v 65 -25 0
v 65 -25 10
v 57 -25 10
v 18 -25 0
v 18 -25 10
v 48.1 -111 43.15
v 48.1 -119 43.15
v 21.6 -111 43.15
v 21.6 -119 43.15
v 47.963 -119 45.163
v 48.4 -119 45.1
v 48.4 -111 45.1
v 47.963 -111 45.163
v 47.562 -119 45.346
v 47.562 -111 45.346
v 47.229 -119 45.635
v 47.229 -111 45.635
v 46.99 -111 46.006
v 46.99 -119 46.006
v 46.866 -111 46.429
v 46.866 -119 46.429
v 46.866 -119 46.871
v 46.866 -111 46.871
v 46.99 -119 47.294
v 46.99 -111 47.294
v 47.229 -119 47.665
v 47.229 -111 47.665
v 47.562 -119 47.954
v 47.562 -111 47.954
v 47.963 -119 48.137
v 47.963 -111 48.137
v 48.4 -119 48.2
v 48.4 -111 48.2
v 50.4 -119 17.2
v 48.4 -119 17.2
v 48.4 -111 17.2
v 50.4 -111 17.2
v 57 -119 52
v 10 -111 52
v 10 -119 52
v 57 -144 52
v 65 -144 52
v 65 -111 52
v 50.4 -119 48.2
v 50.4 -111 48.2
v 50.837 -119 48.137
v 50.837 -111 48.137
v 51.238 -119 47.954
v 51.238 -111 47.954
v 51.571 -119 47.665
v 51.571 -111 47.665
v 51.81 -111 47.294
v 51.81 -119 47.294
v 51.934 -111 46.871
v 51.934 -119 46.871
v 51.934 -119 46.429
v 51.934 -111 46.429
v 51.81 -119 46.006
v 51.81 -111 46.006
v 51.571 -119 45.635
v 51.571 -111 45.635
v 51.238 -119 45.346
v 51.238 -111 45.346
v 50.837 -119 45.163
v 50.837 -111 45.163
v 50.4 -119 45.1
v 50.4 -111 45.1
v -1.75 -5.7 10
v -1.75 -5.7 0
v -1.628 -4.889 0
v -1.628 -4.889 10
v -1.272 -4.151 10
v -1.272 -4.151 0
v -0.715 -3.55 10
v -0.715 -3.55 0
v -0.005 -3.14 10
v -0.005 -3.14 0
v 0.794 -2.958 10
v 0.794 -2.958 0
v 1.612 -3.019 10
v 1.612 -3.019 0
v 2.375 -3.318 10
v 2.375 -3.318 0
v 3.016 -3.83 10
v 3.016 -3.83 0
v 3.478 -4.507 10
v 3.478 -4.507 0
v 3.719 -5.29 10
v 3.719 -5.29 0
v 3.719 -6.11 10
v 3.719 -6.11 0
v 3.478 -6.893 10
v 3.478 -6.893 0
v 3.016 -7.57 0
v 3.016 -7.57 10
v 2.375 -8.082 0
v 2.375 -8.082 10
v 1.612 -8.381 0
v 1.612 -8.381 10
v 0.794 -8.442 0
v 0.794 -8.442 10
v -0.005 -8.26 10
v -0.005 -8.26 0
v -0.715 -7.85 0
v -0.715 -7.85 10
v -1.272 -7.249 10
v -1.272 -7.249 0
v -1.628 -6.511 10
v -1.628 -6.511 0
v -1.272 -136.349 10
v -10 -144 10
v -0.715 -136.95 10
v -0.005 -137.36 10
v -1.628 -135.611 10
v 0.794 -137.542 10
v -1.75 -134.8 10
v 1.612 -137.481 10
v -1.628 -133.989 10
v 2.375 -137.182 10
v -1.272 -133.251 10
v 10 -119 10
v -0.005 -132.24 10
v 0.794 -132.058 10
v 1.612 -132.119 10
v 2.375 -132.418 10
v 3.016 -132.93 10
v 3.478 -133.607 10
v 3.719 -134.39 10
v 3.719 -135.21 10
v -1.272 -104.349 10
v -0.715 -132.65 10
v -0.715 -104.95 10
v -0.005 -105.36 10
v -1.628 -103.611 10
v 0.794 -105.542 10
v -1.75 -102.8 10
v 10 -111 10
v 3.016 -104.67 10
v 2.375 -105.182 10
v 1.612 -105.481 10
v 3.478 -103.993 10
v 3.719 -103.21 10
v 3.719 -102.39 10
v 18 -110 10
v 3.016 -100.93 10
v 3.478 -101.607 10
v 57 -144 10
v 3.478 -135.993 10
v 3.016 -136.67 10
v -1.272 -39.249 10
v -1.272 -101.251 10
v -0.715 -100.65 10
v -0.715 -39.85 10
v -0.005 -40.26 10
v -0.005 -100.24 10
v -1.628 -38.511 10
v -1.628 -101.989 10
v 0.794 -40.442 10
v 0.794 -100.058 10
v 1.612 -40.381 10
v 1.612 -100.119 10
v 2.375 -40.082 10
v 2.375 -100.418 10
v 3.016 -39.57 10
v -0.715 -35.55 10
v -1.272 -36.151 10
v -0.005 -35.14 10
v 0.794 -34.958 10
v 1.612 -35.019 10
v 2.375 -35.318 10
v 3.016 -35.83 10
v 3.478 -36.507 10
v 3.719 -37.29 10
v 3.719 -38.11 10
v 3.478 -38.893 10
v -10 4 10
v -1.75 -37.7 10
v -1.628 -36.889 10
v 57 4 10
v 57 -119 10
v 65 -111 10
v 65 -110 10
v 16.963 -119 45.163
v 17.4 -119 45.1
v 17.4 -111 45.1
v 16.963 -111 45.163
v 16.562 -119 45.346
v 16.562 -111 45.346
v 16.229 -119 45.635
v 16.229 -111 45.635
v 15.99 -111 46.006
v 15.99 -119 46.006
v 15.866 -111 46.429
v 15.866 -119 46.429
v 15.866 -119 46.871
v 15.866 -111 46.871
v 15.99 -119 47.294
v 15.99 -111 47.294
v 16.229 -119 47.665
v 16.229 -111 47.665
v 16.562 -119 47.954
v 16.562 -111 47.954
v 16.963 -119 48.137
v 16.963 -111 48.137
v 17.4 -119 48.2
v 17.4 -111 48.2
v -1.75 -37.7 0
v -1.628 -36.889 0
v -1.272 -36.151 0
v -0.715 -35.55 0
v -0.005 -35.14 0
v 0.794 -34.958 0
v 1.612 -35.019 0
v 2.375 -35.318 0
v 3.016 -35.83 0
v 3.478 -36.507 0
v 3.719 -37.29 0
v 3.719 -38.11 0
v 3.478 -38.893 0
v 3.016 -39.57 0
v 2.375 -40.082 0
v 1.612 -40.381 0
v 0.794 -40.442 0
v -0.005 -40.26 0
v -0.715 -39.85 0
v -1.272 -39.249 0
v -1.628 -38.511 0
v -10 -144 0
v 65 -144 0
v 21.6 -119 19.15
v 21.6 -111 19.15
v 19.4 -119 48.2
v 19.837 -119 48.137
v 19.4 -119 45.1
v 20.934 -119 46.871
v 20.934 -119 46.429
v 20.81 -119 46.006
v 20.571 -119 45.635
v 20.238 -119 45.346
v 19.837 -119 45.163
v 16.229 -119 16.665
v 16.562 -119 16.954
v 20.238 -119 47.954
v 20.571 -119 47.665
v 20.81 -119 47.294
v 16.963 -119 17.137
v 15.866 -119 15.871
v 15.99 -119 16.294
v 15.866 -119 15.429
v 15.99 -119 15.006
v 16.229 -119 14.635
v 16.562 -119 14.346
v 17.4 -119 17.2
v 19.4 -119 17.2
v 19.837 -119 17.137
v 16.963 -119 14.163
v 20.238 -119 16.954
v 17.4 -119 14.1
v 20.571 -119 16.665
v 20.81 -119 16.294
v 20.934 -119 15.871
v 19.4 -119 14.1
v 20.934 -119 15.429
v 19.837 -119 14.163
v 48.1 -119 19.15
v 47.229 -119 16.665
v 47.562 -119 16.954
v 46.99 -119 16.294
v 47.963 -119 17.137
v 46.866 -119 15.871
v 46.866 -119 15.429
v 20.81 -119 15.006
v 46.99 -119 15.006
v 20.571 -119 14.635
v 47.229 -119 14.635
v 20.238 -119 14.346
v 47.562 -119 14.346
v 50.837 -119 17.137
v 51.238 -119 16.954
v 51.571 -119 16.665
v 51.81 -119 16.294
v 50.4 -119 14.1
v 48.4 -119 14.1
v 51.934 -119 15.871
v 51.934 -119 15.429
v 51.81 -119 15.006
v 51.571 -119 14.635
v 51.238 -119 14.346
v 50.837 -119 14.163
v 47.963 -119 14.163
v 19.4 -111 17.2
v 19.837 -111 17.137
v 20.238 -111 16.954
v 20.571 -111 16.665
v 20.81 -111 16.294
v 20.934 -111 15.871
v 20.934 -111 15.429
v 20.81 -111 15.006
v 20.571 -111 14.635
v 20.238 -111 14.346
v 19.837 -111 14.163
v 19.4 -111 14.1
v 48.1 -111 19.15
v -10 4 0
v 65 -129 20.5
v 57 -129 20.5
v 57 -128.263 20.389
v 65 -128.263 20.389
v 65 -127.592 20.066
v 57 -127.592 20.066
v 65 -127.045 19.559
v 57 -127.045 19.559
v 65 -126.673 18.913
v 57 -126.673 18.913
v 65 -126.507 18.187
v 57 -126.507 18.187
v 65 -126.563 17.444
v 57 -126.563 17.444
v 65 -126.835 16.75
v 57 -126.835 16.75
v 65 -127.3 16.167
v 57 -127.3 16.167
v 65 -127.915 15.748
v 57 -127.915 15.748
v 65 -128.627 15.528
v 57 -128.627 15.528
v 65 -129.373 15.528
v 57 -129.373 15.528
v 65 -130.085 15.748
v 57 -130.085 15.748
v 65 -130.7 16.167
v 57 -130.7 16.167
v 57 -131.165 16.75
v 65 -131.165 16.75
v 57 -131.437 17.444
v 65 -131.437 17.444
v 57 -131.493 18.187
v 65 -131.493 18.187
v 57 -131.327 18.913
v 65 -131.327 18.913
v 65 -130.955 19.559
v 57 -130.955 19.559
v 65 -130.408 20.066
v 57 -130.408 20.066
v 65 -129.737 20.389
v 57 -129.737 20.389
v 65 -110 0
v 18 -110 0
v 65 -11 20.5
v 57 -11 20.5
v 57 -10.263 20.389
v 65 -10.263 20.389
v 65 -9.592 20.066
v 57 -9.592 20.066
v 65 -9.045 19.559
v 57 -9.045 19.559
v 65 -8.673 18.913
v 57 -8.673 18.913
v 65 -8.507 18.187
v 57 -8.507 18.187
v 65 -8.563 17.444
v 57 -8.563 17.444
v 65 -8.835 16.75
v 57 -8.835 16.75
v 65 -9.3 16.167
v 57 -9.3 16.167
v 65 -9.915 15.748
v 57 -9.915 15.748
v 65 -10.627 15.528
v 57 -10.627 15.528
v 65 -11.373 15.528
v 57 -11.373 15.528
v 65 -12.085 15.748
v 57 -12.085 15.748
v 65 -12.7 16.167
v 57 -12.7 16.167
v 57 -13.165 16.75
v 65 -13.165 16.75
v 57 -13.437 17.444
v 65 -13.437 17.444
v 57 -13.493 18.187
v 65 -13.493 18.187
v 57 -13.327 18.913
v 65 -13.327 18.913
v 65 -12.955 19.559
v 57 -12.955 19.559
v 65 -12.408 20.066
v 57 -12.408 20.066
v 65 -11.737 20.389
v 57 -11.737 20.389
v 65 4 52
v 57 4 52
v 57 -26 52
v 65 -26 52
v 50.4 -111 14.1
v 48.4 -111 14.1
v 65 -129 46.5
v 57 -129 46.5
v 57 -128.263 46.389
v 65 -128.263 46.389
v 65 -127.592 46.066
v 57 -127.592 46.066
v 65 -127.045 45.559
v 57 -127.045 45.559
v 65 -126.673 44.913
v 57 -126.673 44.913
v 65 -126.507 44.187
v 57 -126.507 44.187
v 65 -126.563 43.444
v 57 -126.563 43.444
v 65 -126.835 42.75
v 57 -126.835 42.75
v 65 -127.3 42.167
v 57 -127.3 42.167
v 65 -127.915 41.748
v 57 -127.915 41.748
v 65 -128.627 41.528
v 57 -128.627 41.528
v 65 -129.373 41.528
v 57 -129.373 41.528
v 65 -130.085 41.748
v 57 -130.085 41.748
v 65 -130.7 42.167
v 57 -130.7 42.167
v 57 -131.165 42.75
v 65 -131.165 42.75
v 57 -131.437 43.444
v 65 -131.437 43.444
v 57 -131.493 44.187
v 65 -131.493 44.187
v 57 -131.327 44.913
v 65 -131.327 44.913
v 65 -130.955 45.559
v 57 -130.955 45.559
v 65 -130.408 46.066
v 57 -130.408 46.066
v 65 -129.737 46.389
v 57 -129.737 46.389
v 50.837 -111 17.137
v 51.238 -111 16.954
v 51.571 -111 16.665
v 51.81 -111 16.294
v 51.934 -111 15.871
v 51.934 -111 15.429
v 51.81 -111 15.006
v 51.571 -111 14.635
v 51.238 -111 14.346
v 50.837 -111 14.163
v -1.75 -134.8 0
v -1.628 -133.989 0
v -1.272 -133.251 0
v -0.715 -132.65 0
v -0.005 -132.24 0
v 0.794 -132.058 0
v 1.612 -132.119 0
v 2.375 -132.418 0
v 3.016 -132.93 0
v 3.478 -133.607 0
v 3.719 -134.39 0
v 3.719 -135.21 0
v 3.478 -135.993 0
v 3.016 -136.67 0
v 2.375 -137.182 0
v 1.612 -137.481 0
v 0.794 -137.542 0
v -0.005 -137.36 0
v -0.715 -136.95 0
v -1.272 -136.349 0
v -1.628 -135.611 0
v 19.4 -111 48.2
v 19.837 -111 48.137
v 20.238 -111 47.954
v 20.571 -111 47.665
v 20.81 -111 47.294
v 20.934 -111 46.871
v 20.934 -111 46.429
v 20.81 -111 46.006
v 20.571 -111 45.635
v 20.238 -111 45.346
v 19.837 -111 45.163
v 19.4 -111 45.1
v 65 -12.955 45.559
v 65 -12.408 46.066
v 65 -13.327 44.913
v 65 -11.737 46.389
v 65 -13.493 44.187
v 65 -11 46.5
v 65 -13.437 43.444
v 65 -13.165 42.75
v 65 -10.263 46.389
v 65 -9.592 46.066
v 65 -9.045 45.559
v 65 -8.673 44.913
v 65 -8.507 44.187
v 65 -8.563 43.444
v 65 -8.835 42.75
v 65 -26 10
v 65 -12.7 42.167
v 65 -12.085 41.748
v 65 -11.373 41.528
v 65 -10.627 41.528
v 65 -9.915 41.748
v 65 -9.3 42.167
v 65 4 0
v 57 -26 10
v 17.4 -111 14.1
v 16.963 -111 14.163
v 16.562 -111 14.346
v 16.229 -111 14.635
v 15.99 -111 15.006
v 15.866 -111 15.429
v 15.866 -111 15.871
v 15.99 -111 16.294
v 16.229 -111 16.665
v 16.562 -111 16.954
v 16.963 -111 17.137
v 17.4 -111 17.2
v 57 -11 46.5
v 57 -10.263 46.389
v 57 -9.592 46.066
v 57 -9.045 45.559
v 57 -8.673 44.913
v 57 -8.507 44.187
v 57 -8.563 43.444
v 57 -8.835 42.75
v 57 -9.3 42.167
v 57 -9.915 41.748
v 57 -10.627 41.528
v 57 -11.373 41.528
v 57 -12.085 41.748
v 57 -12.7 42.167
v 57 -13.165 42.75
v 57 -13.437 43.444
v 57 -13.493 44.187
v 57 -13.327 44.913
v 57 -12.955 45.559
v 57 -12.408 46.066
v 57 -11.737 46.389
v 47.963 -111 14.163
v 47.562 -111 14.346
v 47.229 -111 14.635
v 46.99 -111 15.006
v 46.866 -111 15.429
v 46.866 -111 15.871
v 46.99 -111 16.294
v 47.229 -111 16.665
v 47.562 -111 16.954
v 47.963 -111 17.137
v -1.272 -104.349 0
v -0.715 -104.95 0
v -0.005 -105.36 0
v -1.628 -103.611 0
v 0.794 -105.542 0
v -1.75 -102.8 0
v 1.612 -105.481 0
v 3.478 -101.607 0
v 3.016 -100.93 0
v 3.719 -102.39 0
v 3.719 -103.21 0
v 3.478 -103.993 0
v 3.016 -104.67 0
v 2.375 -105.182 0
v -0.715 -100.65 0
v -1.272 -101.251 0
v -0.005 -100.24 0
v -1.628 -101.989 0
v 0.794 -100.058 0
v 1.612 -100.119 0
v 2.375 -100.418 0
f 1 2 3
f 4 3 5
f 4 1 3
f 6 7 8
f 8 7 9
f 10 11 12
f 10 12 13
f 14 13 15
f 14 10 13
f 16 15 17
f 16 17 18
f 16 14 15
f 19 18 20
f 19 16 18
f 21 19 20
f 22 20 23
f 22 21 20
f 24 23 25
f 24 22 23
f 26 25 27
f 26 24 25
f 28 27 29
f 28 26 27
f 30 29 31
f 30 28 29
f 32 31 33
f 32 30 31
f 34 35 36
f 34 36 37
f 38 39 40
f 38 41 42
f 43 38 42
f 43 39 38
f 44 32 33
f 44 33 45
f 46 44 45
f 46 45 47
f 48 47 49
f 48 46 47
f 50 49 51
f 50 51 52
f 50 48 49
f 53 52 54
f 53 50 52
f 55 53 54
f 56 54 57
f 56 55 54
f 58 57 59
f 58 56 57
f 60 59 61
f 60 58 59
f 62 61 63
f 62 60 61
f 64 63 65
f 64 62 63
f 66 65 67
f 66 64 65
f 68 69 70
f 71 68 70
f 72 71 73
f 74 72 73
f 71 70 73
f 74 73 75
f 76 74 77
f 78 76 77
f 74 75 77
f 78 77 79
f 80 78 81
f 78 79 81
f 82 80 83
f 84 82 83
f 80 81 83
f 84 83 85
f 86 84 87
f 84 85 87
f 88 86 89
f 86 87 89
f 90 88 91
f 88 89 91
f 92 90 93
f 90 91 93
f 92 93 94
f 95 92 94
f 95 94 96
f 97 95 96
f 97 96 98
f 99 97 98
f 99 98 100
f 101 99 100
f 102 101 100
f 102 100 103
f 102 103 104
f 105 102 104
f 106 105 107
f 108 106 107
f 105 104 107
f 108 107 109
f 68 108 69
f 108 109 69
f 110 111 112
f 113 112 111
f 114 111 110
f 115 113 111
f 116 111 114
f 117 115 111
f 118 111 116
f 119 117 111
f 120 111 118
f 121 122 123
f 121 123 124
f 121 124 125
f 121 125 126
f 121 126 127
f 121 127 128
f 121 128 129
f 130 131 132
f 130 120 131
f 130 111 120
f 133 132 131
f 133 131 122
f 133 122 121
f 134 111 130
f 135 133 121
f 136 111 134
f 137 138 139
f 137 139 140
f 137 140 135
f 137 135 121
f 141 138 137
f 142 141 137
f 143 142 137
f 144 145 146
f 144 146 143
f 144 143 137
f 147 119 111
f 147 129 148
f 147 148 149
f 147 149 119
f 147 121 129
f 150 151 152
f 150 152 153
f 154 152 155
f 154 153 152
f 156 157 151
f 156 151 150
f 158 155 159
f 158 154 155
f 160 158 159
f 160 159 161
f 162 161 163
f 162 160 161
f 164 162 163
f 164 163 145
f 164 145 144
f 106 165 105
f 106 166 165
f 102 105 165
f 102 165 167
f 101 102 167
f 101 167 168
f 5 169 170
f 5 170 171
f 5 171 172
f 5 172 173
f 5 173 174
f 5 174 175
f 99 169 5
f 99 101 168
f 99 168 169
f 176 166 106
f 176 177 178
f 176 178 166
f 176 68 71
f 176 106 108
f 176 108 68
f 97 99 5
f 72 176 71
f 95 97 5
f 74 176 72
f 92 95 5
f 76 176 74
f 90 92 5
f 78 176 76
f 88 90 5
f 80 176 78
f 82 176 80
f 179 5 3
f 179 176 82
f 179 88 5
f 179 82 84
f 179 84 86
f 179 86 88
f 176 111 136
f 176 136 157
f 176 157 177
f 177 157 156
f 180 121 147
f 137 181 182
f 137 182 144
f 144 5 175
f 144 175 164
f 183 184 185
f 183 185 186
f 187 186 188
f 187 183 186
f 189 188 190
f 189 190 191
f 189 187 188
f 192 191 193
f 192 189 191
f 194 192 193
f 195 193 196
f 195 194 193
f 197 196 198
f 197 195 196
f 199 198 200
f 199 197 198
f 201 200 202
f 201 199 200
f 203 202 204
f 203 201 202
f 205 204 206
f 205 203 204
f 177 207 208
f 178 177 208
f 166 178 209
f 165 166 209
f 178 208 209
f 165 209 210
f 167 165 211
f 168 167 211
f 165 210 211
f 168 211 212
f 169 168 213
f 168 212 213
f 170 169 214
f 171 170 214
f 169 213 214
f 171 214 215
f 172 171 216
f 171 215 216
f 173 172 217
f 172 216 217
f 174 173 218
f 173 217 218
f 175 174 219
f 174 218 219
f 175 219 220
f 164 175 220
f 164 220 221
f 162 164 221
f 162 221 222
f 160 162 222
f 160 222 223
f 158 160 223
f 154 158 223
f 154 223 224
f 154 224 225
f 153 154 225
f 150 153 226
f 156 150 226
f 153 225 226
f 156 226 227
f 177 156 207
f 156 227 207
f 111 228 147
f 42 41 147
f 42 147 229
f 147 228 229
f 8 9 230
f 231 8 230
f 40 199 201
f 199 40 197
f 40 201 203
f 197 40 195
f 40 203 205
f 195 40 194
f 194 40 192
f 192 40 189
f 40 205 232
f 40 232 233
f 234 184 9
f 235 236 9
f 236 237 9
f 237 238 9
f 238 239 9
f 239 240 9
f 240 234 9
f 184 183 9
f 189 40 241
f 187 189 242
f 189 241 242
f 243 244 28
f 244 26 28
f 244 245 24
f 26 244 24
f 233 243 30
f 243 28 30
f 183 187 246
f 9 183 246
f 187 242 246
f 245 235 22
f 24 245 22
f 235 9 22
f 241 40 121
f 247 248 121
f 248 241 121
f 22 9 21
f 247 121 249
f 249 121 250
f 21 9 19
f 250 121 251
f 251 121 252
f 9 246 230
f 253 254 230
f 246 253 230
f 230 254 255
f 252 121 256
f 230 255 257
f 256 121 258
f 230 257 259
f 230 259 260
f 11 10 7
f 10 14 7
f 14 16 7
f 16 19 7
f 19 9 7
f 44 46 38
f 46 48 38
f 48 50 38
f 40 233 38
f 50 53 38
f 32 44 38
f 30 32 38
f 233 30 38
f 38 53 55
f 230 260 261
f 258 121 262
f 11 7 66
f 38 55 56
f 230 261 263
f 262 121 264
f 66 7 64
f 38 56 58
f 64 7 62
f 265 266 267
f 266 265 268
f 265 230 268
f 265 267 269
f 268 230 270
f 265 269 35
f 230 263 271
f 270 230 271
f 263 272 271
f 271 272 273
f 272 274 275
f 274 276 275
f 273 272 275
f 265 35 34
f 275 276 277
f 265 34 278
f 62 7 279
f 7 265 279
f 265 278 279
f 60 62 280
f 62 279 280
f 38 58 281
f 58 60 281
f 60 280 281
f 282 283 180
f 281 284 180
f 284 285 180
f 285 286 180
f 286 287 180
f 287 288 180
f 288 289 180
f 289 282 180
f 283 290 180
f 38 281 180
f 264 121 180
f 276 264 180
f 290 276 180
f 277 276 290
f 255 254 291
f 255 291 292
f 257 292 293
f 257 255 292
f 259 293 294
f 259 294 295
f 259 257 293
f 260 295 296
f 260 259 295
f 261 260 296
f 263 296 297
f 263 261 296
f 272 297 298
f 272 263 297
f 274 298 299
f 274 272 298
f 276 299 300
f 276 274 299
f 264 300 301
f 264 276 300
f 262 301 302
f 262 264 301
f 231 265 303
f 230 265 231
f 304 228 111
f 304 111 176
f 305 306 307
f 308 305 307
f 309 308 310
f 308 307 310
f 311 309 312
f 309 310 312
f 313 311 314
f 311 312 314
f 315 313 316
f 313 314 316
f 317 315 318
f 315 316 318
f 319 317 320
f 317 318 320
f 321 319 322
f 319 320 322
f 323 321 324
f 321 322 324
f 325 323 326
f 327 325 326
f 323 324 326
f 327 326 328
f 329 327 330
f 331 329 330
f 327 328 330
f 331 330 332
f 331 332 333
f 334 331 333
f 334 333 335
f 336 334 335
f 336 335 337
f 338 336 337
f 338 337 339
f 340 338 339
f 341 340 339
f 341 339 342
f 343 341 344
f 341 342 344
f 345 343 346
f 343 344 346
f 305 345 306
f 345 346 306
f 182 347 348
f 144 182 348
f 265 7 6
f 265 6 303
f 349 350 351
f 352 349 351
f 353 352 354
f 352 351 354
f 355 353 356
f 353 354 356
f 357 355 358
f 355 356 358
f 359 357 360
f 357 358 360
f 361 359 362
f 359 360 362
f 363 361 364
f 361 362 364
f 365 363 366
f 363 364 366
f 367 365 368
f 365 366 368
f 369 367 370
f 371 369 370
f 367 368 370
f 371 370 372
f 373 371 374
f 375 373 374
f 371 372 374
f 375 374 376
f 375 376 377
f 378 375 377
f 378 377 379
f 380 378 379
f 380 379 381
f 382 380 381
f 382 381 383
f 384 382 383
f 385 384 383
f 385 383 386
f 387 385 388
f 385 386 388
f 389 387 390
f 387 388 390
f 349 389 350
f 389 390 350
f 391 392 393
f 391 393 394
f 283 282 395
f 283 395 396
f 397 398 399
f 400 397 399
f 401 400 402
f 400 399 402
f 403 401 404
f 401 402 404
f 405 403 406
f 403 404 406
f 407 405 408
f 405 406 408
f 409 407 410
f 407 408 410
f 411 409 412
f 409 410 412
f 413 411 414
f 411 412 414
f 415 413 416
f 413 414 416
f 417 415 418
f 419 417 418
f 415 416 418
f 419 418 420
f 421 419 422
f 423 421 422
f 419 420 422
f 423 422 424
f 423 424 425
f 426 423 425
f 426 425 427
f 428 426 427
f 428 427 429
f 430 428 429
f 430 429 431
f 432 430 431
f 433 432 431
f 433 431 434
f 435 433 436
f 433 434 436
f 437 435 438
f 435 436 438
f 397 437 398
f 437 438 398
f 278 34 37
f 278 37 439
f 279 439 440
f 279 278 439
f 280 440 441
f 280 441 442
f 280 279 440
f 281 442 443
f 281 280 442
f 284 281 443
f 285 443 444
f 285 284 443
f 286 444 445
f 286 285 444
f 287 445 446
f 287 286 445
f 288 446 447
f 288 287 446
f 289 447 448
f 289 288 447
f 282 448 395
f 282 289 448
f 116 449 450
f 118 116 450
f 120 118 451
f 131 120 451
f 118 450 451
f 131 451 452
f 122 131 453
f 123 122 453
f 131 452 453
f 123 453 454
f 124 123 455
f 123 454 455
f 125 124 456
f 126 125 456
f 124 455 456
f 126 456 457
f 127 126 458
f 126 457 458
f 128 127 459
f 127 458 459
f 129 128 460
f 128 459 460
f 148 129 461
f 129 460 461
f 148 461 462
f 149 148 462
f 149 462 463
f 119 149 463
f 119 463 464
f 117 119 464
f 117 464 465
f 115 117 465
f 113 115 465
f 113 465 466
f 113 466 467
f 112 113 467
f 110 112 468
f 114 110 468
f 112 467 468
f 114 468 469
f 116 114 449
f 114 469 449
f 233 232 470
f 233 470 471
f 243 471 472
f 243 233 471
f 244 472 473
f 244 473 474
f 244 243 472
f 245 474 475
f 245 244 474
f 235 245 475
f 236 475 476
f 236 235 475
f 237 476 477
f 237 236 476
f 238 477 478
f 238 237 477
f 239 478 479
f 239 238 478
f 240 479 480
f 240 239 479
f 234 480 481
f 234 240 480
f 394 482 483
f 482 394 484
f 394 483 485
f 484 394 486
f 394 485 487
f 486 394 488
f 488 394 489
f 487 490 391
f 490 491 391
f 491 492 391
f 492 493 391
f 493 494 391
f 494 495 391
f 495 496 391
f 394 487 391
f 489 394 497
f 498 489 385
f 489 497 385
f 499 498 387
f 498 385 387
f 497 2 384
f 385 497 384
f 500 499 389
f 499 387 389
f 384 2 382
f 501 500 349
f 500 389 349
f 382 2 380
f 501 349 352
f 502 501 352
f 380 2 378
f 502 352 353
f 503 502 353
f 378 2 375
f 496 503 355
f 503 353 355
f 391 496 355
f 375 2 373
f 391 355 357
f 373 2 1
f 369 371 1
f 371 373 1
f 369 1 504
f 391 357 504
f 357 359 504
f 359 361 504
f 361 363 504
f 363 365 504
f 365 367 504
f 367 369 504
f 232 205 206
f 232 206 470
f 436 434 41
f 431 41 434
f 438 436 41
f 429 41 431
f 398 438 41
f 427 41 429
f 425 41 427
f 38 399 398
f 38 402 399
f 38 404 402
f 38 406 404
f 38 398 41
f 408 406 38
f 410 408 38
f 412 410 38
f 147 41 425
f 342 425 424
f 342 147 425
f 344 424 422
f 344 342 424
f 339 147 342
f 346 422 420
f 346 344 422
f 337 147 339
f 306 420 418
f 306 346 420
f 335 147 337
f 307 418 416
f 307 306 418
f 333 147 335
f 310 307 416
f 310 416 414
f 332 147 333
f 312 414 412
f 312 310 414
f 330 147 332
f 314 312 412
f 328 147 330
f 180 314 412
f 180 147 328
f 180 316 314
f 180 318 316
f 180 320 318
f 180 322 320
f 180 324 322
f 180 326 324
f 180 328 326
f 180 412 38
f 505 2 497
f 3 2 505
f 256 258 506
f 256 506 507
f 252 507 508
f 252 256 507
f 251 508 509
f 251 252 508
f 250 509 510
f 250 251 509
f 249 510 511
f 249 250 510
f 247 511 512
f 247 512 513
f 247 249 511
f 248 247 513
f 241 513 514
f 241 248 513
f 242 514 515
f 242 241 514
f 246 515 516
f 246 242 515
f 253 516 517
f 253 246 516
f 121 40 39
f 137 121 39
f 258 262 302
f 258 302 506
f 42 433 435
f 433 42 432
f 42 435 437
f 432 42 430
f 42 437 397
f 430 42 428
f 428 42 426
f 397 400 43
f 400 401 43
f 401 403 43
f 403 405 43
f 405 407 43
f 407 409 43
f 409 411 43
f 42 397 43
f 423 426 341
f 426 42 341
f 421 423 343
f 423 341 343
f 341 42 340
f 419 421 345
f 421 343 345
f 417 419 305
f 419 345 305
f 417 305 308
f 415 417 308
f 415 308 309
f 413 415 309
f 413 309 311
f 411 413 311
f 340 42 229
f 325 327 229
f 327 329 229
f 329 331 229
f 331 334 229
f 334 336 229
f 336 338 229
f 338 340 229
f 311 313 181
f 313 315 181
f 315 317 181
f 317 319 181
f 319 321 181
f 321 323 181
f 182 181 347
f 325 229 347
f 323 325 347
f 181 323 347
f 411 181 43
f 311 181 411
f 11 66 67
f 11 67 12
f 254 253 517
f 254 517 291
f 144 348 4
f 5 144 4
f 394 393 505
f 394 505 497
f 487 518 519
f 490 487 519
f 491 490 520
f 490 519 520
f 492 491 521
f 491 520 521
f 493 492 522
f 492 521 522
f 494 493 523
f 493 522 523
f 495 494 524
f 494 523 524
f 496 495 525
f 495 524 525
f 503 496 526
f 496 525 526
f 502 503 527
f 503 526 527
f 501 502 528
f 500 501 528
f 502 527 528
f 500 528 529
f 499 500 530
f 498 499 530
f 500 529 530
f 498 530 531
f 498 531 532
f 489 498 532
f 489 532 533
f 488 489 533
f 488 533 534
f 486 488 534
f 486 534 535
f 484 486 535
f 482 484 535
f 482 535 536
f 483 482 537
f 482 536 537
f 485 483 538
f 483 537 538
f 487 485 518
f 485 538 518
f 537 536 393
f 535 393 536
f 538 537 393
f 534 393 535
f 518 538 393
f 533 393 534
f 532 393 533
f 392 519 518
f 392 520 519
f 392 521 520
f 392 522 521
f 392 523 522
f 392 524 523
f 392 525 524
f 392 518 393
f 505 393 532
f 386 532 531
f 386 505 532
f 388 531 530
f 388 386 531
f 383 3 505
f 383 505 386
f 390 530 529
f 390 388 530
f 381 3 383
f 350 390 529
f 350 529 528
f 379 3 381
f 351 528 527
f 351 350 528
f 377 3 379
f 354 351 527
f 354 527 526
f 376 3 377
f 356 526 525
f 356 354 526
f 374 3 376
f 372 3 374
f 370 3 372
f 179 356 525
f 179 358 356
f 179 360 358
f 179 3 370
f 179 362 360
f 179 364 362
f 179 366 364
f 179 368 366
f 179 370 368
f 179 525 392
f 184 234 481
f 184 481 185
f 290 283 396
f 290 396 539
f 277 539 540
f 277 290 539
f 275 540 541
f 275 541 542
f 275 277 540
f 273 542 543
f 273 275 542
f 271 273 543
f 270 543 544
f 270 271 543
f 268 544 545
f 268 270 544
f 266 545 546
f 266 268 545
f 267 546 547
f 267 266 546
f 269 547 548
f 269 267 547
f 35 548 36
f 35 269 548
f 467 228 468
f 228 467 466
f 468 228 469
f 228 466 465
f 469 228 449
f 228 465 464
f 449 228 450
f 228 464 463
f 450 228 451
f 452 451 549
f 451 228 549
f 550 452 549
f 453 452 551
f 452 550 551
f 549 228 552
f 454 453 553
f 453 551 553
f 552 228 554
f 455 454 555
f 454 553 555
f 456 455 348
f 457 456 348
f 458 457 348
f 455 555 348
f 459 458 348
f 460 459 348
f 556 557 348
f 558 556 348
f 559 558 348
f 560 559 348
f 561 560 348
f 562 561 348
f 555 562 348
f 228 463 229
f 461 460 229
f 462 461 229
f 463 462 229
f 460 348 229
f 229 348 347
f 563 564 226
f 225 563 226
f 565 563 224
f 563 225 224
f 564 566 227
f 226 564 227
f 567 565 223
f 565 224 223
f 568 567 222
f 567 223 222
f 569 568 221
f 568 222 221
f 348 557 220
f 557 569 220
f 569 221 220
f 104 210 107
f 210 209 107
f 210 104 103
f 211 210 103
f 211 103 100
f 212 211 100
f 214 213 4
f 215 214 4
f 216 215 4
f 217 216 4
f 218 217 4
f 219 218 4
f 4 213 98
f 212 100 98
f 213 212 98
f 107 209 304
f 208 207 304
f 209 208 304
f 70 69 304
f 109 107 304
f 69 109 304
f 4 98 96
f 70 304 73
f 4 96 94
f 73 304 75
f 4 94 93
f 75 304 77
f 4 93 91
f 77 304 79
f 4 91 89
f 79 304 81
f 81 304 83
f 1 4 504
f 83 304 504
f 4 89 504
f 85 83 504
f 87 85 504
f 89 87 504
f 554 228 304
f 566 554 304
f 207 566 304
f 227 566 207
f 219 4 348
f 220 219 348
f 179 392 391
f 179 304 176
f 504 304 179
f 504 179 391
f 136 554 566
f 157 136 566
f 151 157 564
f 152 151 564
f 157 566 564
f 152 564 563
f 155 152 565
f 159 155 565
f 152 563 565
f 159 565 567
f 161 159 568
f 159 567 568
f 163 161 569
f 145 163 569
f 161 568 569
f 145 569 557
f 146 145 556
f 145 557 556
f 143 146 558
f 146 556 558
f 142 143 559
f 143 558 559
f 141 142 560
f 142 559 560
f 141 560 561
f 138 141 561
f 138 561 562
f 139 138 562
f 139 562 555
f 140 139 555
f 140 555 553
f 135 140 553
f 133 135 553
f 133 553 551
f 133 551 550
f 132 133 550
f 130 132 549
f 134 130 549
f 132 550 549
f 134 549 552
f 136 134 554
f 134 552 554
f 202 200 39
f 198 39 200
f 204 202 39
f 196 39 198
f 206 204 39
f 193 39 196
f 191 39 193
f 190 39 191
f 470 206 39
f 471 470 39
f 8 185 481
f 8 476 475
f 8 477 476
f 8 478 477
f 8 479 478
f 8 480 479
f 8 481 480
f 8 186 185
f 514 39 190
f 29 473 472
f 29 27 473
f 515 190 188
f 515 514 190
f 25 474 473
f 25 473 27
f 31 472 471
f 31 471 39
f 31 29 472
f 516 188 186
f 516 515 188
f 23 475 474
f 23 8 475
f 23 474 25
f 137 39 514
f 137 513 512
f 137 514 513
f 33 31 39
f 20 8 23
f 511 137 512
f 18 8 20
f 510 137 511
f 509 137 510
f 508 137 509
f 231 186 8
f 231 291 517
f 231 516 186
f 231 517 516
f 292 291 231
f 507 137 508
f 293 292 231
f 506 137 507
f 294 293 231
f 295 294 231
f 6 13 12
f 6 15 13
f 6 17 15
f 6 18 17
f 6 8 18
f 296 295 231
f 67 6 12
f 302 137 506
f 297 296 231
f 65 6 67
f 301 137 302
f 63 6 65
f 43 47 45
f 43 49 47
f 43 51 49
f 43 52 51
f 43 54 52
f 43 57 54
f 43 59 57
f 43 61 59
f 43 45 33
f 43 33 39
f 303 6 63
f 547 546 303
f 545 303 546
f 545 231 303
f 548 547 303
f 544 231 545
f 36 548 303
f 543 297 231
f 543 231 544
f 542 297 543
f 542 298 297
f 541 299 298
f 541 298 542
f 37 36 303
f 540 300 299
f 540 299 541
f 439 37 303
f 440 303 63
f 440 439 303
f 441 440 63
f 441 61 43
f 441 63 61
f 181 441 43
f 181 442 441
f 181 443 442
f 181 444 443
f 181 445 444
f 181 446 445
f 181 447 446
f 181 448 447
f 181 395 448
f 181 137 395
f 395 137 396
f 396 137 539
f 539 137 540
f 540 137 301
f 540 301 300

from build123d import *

# Parameters (mm, degrees)
SKETCH1_W           = 75
SKETCH1_H           = 148
BOSS_EXTRUDE1_DEPTH = 10
SKETCH2_W           = 55
SKETCH2_H           = 8
BOSS_EXTRUDE2_DEPTH = 42
SKETCH3_W           = 26.5
SKETCH3_H           = 24
CUT_EXTRUDE1_DEPTH  = 8
SKETCH4_W           = 8
SKETCH4_H           = 30
SKETCH4_H_2         = 25
BOSS_EXTRUDE3_DEPTH = 42
SKETCH5_R           = 2.5
CUT_EXTRUDE2_DEPTH  = 8
CUT_EXTRUDE3_DEPTH  = 8
SKETCH10_R          = 2.75
CUT_EXTRUDE5_DEPTH  = 10
SKETCH11_W          = 47
SKETCH11_H          = 85
CUT_EXTRUDE6_DEPTH  = 10


with BuildPart() as part:
    # Sketch1 → Boss-Extrude1 (new body)
    with BuildSketch(Plane.XY):
        with Locations((27.5, -70)):
            Rectangle(SKETCH1_W, SKETCH1_H)
    extrude(amount=BOSS_EXTRUDE1_DEPTH)

    # Sketch2 → Boss-Extrude2 (add)
    with BuildSketch(Plane.XY.offset(10)):
        with Locations((37.5, -115)):
            Rectangle(SKETCH2_W, SKETCH2_H)
    extrude(amount=BOSS_EXTRUDE2_DEPTH)

    # Sketch3 → Cut-Extrude1 (cut)
    with BuildSketch(Plane(origin=(0, -119, 0), x_dir=(-1, 0, 0), z_dir=(0, -1, 0))):
        with Locations((-34.85, -31.15)):
            Rectangle(SKETCH3_W, SKETCH3_H)
    extrude(amount=-CUT_EXTRUDE1_DEPTH, mode=Mode.SUBTRACT)

    # Sketch4 → Boss-Extrude3 (add)
    with BuildSketch(Plane.XY.offset(10)):
        with Locations((61, -11)):
            Rectangle(SKETCH4_W, SKETCH4_H)
        with Locations((61, -131.5)):
            Rectangle(SKETCH4_W, SKETCH4_H_2)
    extrude(amount=BOSS_EXTRUDE3_DEPTH)

    # Sketch5 → Cut-Extrude2 (cut)
    with BuildSketch(Plane.ZY.offset(-57)):
        with Locations((18, -11)):
            Circle(SKETCH5_R)
        with Locations((44, -11)):
            Circle(SKETCH5_R)
        with Locations((44, -129)):
            Circle(SKETCH5_R)
        with Locations((18, -129)):
            Circle(SKETCH5_R)
    extrude(amount=-CUT_EXTRUDE2_DEPTH, mode=Mode.SUBTRACT)

    # Sketch6 → Cut-Extrude3 (cut)
    with BuildSketch(Plane(origin=(0, -119, 0), x_dir=(-1, 0, 0), z_dir=(0, -1, 0))):
        with BuildLine():
            Line((-19.4, -45.1), (-17.4, -45.1))
            ThreePointArc((-17.4, -45.1), (-15.85, -46.65), (-17.4, -48.2))
            Line((-17.4, -48.2), (-19.4, -48.2))
            ThreePointArc((-19.4, -48.2), (-20.95, -46.65), (-19.4, -45.1))
        make_face()
        with BuildLine():
            Line((-19.4, -14.1), (-17.4, -14.1))
            ThreePointArc((-17.4, -14.1), (-15.85, -15.65), (-17.4, -17.2))
            Line((-17.4, -17.2), (-19.4, -17.2))
            ThreePointArc((-19.4, -17.2), (-20.95, -15.65), (-19.4, -14.1))
        make_face()
        with BuildLine():
            Line((-50.4, -45.1), (-48.4, -45.1))
            ThreePointArc((-48.4, -45.1), (-46.85, -46.65), (-48.4, -48.2))
            Line((-48.4, -48.2), (-50.4, -48.2))
            ThreePointArc((-50.4, -48.2), (-51.95, -46.65), (-50.4, -45.1))
        make_face()
        with BuildLine():
            Line((-50.4, -14.1), (-48.4, -14.1))
            ThreePointArc((-48.4, -14.1), (-46.85, -15.65), (-48.4, -17.2))
            Line((-48.4, -17.2), (-50.4, -17.2))
            ThreePointArc((-50.4, -17.2), (-51.95, -15.65), (-50.4, -14.1))
        make_face()
    extrude(amount=-CUT_EXTRUDE3_DEPTH, mode=Mode.SUBTRACT)

    # Sketch10 → Cut-Extrude5 (cut)
    with BuildSketch(Plane(origin=(0, 0, 0), x_dir=(-1, 0, 0), z_dir=(0, 0, -1))):
        with Locations((-1, -102.8)):
            Circle(SKETCH10_R)
        with Locations((-1, -134.8)):
            Circle(SKETCH10_R)
        with Locations((-1, -37.7)):
            Circle(SKETCH10_R)
        with Locations((-1, -5.7)):
            Circle(SKETCH10_R)
    extrude(amount=-CUT_EXTRUDE5_DEPTH, mode=Mode.SUBTRACT)

    # Sketch11 → Cut-Extrude6 (cut)
    with BuildSketch(Plane(origin=(0, 0, 0), x_dir=(-1, 0, 0), z_dir=(0, 0, -1))):
        with Locations((-41.5, -67.5)):
            Rectangle(SKETCH11_W, SKETCH11_H)
    extrude(amount=-CUT_EXTRUDE6_DEPTH, mode=Mode.SUBTRACT)


solid = part.part
